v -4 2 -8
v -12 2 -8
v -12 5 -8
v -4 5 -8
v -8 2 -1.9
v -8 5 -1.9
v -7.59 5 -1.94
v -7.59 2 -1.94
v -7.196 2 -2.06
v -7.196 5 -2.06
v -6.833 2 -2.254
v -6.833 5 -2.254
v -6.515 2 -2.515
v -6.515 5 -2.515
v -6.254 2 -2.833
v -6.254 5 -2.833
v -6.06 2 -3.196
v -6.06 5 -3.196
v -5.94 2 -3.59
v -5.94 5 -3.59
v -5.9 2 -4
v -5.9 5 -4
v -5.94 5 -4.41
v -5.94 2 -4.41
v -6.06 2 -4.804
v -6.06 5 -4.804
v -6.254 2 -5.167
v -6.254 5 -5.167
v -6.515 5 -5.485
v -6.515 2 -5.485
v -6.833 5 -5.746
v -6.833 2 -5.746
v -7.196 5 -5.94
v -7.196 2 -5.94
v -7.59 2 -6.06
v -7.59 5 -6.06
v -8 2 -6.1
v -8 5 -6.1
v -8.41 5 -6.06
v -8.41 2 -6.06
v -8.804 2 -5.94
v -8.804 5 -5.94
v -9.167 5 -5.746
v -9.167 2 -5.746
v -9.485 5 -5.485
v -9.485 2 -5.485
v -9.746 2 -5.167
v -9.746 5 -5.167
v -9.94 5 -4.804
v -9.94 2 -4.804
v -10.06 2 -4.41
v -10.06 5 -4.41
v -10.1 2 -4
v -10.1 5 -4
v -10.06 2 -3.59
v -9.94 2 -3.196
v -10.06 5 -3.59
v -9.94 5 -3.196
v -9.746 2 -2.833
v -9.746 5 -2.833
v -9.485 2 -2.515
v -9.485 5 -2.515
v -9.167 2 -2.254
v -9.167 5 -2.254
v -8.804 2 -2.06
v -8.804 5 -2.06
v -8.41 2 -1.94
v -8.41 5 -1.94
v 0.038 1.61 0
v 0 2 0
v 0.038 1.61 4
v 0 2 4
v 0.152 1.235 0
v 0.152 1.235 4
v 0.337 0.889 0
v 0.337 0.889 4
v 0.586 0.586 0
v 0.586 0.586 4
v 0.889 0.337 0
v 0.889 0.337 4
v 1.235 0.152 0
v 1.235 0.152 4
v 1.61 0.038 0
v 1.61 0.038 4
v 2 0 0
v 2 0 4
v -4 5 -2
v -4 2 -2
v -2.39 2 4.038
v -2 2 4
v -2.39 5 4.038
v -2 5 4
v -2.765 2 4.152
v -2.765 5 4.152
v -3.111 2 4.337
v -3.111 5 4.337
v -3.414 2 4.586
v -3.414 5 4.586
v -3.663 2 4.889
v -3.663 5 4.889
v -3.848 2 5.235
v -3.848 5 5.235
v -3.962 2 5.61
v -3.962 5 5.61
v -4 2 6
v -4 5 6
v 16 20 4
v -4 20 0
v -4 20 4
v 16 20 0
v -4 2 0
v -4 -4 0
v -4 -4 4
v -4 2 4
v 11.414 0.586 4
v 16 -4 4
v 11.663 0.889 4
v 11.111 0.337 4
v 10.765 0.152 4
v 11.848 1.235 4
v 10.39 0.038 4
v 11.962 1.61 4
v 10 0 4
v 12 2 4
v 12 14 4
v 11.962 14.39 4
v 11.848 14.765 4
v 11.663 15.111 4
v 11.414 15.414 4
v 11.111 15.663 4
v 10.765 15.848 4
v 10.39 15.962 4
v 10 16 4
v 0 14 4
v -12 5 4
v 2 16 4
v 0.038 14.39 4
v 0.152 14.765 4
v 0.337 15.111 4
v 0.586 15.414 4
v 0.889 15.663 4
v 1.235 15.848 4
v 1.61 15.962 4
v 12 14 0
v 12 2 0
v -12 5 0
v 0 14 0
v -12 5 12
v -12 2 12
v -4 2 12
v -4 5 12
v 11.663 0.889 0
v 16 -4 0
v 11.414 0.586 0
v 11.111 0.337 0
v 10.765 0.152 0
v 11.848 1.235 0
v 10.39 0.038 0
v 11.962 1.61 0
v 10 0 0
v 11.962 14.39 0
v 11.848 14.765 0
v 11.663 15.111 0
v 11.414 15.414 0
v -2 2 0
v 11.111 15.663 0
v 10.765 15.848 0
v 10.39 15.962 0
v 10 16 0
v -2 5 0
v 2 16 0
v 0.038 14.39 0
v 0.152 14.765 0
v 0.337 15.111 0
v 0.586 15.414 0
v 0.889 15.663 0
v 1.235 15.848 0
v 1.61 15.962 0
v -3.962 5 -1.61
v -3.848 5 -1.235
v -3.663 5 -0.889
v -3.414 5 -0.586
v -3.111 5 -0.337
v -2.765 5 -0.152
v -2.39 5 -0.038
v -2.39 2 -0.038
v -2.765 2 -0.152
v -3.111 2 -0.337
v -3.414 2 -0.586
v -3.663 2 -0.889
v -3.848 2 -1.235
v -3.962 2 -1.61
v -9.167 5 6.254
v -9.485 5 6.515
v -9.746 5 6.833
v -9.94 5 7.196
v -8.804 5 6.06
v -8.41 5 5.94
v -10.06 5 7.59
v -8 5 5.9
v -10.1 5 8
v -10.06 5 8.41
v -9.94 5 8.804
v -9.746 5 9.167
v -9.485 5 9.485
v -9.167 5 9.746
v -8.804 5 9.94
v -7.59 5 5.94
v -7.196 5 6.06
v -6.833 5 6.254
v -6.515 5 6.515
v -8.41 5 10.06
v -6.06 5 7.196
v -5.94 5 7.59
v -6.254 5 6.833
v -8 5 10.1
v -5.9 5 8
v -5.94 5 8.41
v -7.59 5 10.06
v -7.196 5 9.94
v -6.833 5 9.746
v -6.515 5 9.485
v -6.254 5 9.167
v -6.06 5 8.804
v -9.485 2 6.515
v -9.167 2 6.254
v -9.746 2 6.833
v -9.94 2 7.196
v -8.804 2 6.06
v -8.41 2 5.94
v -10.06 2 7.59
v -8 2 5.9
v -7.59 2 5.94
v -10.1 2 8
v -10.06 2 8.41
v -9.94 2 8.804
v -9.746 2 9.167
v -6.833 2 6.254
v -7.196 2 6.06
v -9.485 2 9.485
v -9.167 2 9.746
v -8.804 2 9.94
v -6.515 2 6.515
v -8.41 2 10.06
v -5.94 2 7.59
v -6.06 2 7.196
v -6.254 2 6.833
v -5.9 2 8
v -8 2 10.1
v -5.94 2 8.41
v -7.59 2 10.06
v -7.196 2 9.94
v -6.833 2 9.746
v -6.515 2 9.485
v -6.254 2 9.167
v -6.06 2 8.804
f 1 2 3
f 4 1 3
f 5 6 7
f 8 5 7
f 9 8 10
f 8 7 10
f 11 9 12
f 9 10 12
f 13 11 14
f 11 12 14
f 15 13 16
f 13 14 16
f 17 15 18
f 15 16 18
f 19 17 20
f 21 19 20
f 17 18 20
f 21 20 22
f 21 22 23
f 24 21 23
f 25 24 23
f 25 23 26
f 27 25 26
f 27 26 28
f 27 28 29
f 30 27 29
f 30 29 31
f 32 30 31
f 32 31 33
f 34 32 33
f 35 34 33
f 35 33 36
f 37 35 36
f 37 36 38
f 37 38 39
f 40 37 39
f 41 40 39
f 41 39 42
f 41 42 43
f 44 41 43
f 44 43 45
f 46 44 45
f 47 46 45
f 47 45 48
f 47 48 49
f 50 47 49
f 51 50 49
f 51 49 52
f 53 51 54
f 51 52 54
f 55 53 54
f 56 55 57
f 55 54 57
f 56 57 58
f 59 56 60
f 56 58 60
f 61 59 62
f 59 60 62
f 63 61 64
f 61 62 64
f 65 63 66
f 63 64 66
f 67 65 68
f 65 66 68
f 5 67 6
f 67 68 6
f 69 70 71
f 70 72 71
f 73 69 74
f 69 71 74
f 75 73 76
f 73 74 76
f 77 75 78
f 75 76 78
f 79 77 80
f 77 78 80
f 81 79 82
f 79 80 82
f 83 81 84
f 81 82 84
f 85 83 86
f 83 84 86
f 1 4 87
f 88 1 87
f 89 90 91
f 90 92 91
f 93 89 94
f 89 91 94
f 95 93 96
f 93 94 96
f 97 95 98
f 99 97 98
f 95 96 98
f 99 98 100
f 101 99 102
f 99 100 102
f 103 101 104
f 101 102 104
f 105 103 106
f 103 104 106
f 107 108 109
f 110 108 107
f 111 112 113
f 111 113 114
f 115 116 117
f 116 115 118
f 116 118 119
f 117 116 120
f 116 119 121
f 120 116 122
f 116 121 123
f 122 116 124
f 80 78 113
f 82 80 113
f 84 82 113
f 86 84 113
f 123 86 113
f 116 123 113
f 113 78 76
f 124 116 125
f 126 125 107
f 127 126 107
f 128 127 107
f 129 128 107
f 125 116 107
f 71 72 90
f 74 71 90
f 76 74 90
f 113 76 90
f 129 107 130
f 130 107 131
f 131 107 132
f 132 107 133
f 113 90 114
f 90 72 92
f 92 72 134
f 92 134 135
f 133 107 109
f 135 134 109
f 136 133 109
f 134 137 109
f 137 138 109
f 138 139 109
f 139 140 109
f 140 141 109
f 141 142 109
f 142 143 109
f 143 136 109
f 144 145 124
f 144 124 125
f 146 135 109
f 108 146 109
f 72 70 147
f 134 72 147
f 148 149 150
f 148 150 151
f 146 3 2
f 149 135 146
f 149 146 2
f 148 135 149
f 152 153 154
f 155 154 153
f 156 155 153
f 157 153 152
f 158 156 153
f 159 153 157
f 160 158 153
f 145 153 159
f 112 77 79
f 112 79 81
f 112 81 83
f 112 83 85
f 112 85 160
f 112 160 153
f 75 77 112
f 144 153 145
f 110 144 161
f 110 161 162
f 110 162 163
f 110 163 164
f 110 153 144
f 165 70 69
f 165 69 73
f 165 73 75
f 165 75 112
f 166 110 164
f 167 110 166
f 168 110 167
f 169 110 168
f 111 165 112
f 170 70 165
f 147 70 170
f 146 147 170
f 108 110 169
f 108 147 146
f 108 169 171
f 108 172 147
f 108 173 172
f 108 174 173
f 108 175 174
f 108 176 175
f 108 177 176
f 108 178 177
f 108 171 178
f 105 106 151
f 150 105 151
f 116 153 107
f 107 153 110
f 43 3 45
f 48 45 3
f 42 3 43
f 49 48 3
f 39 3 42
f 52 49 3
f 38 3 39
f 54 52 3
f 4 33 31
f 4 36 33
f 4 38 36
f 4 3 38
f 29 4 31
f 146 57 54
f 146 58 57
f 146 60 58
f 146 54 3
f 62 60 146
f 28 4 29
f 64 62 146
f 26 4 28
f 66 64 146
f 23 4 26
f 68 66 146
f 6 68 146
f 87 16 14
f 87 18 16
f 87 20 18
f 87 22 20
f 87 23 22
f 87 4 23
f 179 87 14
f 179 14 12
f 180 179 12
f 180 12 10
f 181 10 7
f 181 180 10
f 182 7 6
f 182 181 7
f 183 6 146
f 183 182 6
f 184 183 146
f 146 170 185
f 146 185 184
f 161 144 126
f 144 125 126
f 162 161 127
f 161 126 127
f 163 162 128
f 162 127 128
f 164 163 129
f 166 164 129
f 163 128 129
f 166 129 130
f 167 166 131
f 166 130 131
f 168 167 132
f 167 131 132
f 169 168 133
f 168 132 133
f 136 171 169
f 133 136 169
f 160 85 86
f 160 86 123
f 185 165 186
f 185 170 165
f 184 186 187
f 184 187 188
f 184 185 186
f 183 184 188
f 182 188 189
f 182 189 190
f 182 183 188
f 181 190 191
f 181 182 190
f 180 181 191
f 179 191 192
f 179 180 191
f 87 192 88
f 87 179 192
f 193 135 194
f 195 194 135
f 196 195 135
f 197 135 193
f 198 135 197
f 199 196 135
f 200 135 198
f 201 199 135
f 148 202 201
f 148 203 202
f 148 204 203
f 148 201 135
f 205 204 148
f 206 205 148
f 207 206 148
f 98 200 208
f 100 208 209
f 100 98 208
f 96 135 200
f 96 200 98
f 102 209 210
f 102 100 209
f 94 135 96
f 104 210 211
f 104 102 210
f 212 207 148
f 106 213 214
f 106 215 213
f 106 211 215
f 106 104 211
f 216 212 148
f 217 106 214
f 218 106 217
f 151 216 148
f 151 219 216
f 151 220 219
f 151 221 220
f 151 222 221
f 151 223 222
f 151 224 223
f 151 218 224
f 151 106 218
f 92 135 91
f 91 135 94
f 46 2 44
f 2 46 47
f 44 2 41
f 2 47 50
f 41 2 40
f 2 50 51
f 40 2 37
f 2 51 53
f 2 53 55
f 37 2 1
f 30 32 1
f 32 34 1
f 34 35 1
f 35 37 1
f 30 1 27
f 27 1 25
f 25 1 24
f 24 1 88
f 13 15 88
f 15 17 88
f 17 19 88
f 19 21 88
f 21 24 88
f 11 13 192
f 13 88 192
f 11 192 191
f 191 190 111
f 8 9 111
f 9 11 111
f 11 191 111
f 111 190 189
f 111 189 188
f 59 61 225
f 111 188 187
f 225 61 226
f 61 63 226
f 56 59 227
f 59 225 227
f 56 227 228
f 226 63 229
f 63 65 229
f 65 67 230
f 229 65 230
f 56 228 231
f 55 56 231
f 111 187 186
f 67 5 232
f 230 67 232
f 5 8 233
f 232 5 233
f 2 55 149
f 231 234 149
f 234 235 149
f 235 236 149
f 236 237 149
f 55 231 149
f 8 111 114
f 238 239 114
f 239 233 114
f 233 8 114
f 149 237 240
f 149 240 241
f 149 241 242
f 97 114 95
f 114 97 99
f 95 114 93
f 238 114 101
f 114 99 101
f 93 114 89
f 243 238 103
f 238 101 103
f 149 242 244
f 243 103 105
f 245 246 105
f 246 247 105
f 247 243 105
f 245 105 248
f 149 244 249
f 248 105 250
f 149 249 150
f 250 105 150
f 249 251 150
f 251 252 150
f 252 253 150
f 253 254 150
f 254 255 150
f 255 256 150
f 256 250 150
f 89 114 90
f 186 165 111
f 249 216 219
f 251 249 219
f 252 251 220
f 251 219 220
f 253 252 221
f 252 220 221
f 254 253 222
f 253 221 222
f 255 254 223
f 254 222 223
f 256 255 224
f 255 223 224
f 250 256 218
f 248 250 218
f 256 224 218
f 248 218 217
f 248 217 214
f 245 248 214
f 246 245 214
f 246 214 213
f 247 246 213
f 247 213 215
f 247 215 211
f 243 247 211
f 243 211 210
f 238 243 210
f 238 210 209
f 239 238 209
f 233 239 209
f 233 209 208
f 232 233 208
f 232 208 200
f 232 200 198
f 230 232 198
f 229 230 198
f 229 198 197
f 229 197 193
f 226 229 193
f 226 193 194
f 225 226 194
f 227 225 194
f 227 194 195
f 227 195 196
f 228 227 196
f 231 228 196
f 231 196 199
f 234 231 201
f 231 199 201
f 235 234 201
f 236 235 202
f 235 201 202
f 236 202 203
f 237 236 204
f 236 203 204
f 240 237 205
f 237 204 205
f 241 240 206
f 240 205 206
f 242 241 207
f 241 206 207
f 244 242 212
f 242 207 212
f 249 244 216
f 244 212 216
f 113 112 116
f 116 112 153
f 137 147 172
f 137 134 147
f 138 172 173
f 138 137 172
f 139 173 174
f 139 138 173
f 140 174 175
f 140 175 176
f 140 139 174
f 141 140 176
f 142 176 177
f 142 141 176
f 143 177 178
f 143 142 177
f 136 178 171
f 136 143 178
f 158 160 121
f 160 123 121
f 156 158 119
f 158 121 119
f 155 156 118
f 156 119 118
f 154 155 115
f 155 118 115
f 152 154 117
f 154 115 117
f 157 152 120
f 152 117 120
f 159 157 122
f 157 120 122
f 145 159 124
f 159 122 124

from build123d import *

# Parameters (mm, degrees)
SKETCH_1_W          = 20
SKETCH_1_H          = 24
SKETCH_1_W_2        = 12
SKETCH_1_H_2        = 16
EXTRUDE_1_DEPTH     = 4
SKETCH_2_W          = 20
SKETCH_2_H          = 3
EXTRUDE_2_DEPTH     = 8
EXTRUDE_3_DEPTH     = 4
SKETCH_4_R          = 2.1
CUT_EXTRUDE_1_DEPTH = 26
FILLET_1_R          = 2
FILLET_4_R          = 2


with BuildPart() as part:
    # 草图1 → 凸台-拉伸1 (new body)
    with BuildSketch(Plane.XY):
        with Locations((6, 8)):
            Rectangle(SKETCH_1_W, SKETCH_1_H)
        with Locations((6, 8)):
            Rectangle(SKETCH_1_W_2, SKETCH_1_H_2, mode=Mode.SUBTRACT)
    extrude(amount=EXTRUDE_1_DEPTH)

    # 草图2 → 凸台-拉伸2 (add)
    with BuildSketch(Plane.ZY.offset(4)):
        with Locations((2, 3.5)):
            Rectangle(SKETCH_2_W, SKETCH_2_H)
    extrude(amount=EXTRUDE_2_DEPTH)

    # 草图3 → 凸台-拉伸3 (add)
    with BuildSketch(Plane.XY.offset(4)):
        Polygon((-12, 5), (-4, 20), (-4, 5), align=None)
    extrude(amount=-EXTRUDE_3_DEPTH)

    # 草图4 → 切除-拉伸1 (cut, through all)
    with BuildSketch(Plane(origin=(0, 5, 0), x_dir=(1, 0, 0), z_dir=(0, 1, 0))):
        with Locations(Location((-8, 4, 0), (0, 0, 270))):
            Circle(SKETCH_4_R)
        with Locations(Location((-8, -8, 0), (0, 0, 270))):
            Circle(SKETCH_4_R)
    extrude(amount=-CUT_EXTRUDE_1_DEPTH, mode=Mode.SUBTRACT)

    # 圆角1
    fillet_1_edges = [part.edges().sort_by_distance(p)[0] for p in [
        (0, 16, 2),
        (0, 0, 2),
        (12, 0, 2),
        (12, 16, 2),
    ]]
    fillet(fillet_1_edges, radius=FILLET_1_R)

    # 圆角4
    fillet_4_edges = [part.edges().sort_by_distance(p)[0] for p in [
        (-4, 3.5, 0),
        (-4, 3.5, 4),
    ]]
    fillet(fillet_4_edges, radius=FILLET_4_R)


solid = part.part
